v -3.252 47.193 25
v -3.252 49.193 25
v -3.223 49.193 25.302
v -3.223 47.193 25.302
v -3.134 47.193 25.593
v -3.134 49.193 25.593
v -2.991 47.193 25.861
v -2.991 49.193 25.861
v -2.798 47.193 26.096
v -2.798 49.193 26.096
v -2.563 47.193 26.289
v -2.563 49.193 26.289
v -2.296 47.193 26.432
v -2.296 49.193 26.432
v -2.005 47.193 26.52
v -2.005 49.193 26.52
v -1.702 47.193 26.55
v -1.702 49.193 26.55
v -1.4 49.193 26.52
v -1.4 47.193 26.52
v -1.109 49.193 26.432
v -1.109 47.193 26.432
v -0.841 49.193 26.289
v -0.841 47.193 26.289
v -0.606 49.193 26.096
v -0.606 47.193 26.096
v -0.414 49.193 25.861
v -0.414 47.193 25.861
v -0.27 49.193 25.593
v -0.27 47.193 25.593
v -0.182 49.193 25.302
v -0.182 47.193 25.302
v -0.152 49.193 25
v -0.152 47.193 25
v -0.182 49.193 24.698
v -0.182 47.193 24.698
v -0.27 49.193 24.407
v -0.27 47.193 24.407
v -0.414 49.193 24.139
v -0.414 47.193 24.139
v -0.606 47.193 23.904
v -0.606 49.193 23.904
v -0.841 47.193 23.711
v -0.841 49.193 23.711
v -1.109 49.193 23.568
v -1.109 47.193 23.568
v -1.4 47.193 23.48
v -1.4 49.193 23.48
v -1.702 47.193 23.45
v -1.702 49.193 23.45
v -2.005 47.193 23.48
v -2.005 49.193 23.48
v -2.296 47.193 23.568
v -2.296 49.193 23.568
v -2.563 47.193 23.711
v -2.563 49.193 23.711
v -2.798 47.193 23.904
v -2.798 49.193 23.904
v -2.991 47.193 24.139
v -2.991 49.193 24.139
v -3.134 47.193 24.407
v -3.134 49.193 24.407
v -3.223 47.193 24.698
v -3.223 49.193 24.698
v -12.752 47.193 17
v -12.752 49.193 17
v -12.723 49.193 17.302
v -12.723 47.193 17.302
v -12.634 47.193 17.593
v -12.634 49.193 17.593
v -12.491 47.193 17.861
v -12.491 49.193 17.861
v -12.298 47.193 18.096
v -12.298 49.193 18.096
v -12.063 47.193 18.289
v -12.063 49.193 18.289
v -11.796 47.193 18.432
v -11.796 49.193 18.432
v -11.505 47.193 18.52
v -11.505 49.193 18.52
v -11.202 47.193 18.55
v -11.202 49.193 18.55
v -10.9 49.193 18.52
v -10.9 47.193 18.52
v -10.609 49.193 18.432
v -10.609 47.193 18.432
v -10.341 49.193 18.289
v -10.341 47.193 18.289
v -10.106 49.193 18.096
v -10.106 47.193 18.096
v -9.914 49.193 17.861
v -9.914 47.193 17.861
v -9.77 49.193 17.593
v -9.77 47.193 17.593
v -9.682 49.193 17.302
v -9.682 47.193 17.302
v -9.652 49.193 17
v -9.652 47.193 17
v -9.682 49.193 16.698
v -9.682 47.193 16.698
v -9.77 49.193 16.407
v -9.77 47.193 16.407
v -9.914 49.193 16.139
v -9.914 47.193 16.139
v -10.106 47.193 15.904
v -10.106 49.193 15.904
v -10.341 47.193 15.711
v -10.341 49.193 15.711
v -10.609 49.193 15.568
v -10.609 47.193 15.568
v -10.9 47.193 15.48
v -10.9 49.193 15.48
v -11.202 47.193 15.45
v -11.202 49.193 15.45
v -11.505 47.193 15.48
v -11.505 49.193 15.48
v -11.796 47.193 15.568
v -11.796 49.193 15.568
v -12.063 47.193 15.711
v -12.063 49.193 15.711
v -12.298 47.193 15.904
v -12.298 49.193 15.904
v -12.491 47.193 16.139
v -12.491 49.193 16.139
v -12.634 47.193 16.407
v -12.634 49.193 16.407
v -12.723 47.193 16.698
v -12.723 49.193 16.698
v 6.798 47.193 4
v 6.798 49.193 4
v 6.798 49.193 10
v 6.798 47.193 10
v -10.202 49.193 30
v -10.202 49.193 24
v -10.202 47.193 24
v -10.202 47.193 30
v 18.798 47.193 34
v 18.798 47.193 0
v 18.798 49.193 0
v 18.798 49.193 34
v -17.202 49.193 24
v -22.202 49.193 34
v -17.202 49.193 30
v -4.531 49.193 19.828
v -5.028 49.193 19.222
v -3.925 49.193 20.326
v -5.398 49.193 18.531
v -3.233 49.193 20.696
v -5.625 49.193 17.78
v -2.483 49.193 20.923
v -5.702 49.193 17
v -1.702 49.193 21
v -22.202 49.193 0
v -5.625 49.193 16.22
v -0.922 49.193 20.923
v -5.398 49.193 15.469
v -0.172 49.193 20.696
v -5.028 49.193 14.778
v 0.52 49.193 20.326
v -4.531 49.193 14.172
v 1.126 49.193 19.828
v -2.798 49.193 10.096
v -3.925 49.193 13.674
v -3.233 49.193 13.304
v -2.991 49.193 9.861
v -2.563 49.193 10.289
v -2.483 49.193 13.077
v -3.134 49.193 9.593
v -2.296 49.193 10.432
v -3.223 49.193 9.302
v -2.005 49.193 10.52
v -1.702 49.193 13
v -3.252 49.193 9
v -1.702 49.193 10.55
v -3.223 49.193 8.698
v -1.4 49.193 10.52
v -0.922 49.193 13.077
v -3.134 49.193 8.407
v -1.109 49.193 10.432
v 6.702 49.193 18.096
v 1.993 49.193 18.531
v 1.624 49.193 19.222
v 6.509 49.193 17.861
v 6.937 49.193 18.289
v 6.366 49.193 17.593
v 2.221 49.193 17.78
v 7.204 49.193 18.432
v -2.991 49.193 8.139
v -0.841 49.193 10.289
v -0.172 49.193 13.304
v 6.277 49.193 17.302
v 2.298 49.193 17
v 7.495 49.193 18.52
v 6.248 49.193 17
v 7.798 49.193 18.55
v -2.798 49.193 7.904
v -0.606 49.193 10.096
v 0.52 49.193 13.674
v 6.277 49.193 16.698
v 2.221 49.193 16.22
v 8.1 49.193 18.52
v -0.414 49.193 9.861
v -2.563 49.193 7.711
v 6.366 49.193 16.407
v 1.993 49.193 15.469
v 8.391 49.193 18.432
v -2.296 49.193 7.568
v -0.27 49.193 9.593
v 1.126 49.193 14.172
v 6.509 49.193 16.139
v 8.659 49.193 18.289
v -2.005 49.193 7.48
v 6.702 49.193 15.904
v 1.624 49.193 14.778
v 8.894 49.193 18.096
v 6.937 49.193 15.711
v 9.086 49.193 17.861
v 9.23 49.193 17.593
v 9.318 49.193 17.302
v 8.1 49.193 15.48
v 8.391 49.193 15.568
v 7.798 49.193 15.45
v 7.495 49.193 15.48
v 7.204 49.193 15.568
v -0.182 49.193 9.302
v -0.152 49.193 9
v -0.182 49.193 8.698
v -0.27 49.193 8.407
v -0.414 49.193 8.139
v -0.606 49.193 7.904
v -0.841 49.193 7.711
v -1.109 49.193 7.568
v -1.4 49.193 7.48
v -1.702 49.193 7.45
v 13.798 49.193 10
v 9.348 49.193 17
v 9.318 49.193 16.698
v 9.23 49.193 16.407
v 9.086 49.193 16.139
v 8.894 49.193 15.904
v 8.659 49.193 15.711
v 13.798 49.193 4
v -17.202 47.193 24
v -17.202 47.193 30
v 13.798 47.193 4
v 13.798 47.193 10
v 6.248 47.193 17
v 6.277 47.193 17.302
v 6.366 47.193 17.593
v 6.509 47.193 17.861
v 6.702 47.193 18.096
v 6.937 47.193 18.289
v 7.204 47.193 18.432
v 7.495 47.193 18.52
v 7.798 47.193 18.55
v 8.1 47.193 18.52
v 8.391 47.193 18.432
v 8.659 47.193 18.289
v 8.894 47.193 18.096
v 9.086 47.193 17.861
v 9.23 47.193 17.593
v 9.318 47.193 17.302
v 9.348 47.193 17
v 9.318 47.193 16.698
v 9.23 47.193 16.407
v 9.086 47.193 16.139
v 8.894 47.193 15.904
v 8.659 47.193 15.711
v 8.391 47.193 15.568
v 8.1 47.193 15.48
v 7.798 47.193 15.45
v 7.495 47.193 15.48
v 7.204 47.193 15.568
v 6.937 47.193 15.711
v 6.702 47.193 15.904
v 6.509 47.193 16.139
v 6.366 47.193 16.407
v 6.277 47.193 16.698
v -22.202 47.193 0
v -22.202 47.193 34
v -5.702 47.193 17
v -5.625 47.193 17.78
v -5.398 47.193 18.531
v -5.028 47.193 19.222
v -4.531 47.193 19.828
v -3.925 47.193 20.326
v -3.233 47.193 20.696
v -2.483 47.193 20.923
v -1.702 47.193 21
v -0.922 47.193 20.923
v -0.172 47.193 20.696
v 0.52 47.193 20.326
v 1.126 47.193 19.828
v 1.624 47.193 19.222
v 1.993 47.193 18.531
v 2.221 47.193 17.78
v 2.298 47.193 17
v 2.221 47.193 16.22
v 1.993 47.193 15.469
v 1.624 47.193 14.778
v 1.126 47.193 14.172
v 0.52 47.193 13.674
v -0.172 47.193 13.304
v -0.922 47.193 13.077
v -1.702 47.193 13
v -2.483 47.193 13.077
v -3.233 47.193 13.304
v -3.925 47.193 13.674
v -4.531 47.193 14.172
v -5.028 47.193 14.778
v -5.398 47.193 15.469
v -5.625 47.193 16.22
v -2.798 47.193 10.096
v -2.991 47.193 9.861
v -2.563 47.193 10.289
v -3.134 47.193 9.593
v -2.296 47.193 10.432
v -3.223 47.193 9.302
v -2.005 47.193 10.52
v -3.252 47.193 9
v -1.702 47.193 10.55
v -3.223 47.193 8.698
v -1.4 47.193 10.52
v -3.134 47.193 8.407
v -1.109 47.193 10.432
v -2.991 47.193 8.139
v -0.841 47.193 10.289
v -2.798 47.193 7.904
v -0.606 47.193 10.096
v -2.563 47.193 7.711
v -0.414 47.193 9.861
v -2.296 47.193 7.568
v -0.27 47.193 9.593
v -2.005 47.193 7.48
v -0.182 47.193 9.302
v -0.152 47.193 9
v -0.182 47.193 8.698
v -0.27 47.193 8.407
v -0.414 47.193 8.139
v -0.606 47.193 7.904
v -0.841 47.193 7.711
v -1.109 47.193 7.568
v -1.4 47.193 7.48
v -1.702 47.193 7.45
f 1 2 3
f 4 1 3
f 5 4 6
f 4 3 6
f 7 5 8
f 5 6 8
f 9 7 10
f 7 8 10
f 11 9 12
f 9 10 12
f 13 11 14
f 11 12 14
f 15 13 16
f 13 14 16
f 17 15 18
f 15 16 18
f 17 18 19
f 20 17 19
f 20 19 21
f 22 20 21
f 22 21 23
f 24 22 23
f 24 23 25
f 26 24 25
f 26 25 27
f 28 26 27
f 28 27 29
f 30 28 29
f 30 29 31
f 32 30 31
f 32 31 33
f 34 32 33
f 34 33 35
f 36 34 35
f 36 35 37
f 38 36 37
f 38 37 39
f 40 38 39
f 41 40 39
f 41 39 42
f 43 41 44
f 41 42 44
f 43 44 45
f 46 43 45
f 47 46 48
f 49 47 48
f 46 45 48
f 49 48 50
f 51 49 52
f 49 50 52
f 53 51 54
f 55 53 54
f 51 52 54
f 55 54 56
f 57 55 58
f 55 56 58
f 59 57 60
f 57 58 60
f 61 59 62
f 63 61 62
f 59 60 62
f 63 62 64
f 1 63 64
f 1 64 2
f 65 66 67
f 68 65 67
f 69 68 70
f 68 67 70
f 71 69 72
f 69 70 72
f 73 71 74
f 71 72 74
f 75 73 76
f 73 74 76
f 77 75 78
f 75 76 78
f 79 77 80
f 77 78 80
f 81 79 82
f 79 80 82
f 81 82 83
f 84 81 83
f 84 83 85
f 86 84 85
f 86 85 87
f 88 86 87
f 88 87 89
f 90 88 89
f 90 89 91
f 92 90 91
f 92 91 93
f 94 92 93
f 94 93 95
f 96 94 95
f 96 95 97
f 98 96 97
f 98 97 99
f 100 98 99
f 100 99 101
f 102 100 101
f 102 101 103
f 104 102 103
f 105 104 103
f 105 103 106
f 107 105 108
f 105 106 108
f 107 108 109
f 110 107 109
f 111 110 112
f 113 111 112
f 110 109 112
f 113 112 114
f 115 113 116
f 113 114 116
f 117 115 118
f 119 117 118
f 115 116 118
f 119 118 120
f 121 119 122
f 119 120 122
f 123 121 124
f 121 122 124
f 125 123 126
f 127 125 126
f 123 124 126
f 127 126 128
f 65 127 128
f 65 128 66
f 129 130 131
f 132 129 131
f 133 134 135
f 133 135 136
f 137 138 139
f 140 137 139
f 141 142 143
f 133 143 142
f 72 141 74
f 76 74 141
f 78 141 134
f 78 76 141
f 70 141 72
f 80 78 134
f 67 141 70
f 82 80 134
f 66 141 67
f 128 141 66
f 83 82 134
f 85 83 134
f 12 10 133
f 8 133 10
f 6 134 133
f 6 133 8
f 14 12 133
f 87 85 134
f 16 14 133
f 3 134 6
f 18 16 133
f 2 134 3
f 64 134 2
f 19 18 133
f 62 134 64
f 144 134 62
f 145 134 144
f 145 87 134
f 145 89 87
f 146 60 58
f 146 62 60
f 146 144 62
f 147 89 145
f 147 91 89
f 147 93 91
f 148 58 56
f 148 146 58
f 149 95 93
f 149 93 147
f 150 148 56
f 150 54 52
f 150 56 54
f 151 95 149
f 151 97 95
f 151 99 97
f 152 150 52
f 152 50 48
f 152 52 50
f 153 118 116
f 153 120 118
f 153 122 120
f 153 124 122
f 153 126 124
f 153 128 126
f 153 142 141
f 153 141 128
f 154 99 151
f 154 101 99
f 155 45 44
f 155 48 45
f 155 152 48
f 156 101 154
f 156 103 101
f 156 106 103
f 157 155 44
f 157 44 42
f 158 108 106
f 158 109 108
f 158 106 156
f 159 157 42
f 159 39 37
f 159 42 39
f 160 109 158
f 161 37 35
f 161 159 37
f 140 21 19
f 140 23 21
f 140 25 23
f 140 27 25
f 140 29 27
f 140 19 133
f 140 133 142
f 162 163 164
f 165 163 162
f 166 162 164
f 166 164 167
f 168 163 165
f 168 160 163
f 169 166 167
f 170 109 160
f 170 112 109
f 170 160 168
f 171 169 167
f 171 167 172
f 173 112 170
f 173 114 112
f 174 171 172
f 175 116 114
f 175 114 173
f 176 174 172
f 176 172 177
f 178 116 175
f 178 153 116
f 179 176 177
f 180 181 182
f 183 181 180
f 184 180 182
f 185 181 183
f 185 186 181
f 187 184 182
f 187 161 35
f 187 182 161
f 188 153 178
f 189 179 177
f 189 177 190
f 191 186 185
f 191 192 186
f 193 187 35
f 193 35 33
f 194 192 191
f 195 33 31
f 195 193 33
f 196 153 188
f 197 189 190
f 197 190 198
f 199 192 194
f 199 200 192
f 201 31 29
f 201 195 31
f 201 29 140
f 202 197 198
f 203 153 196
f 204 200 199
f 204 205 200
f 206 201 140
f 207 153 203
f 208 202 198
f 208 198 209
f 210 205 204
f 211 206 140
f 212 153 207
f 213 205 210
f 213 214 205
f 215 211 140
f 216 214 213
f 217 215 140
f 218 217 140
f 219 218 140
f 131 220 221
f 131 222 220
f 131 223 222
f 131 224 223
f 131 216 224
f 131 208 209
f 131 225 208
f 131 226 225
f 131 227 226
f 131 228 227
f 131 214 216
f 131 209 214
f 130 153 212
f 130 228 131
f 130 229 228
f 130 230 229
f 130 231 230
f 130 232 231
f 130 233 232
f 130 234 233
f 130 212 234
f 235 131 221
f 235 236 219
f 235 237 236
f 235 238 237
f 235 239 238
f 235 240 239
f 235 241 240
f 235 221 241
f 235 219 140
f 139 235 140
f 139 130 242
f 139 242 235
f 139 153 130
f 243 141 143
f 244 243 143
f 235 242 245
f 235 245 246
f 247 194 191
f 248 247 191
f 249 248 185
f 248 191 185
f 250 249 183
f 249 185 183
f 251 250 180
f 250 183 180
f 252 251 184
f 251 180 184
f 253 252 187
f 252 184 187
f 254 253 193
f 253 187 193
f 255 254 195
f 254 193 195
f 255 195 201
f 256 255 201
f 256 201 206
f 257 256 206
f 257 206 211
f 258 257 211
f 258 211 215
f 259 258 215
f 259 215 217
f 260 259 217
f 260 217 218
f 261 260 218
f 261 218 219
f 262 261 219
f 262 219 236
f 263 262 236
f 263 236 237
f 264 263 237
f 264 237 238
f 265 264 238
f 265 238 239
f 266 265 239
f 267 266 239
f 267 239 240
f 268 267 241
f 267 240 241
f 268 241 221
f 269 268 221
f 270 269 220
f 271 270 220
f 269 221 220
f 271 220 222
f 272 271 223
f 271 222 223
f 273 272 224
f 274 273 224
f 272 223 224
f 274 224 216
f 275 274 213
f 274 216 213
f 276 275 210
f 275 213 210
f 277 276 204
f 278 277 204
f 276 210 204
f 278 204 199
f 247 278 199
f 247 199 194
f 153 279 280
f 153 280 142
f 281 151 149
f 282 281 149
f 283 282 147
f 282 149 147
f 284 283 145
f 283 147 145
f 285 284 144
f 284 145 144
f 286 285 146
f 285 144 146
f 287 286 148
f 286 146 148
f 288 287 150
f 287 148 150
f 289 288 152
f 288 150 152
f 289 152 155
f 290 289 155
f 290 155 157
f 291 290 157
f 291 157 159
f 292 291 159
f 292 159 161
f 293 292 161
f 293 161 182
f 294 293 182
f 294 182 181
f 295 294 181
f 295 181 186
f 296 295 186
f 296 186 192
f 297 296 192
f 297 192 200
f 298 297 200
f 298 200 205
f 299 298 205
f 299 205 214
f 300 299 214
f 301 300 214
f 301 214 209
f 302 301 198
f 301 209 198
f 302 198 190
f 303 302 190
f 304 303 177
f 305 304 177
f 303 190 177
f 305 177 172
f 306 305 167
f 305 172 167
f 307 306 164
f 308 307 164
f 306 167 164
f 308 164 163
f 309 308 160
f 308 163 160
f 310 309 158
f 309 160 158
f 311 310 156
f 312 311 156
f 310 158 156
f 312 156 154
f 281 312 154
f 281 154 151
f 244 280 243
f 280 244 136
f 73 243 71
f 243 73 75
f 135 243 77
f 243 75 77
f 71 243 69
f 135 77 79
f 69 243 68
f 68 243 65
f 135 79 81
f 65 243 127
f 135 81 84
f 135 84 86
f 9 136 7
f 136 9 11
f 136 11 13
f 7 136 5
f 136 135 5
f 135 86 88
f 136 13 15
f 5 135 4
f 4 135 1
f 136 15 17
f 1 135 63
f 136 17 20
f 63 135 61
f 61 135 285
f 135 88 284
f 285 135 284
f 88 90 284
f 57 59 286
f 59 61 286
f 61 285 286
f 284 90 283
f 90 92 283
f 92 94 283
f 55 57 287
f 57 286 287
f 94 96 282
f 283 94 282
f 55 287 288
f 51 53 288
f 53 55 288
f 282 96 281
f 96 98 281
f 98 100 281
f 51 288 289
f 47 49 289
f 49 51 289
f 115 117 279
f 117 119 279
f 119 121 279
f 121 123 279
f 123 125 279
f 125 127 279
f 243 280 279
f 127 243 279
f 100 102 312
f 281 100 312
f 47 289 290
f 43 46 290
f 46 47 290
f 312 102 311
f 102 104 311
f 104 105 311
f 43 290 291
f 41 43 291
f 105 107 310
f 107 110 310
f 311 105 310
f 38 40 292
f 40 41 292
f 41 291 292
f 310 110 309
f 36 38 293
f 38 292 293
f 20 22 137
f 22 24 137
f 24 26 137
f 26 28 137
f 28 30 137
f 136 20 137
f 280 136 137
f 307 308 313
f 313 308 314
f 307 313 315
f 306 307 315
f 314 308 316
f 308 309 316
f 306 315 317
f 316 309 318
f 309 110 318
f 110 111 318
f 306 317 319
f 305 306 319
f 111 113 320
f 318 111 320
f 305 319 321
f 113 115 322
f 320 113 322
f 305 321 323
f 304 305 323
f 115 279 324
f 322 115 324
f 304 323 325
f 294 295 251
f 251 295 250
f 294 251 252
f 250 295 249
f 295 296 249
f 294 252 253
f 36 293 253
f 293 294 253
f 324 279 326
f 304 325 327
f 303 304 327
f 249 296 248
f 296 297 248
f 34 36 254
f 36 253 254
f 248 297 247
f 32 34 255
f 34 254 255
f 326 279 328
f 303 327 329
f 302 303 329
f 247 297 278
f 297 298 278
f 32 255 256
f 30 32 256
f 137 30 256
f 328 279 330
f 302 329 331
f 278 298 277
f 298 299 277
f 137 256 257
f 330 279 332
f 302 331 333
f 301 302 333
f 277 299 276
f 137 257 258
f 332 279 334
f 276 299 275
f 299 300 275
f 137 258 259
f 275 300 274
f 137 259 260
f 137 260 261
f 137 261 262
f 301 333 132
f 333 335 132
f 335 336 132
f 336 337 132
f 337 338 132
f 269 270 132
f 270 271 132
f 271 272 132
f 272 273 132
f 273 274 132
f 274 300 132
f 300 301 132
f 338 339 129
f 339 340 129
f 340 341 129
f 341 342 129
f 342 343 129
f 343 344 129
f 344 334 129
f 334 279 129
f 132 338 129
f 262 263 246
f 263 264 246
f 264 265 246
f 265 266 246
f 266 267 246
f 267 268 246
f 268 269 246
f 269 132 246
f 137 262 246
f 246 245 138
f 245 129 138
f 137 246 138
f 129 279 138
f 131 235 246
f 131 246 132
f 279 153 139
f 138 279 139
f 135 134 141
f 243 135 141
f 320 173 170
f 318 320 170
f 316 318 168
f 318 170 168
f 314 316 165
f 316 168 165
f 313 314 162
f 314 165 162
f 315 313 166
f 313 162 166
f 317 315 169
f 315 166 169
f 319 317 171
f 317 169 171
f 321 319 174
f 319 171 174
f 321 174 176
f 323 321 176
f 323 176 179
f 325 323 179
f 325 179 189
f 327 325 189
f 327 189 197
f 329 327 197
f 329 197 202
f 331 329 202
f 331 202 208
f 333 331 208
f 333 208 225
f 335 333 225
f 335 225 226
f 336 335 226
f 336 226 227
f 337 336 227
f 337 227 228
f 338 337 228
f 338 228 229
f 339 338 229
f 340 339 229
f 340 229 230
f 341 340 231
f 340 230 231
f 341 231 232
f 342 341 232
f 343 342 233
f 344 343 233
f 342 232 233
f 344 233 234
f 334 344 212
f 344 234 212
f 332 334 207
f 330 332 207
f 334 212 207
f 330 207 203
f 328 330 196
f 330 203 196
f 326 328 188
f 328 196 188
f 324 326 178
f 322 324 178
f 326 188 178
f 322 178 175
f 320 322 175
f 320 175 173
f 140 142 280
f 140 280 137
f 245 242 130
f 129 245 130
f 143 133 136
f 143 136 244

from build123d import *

# Parameters (mm, degrees)
F0_W     = 41
F0_H     = 90
F1_DEPTH = 34
F2_W     = 35
F2_H     = 29
F3_DEPTH = 86
F4_W     = 7
F4_H     = 6
F4_R     = 4
F4_R_2   = 1.55
F5_DEPTH = 4
F6_DEPTH = 86
F7_DEPTH = 2


with BuildPart() as f1:
    # F0 (on Top) → F1 (new body)
    with BuildSketch(Plane.XY):
        with Locations((-1.7023412511, 4.193077401)):
            Rectangle(F0_W, F0_H)
    extrude(amount=F1_DEPTH)

    # F2 (on face) → F3 (cut)
    with BuildSketch(Plane.XZ.offset(40.806922599)):
        with Locations((-1.7023412511, 17)):
            Rectangle(F2_W, F2_H)
    extrude(amount=-F3_DEPTH, mode=Mode.SUBTRACT)

    # F4 (on face) → F5 (cut, through all)
    with BuildSketch(Plane(origin=(0, 49.193077401, 0), x_dir=(-1, 0, 0), z_dir=(0, 1, 0))):
        with Locations((-10.2976587489, 7)):
            Rectangle(F4_W, F4_H)
        with Locations((1.7023412511, 17)):
            Circle(F4_R)
        with Locations((13.7023412511, 27)):
            Rectangle(F4_W, F4_H)
        with Locations((11.2023412511, 17)):
            Circle(F4_R_2)
        with Locations((-7.7976587489, 17)):
            Circle(F4_R_2)
        with Locations((1.7023412511, 25)):
            Circle(F4_R_2)
        with Locations((1.7023412511, 9)):
            Circle(F4_R_2)
    extrude(amount=-F5_DEPTH, mode=Mode.SUBTRACT)

    # F6 (cut): a face of the model
    f6_faces = [f1.faces().sort_by_distance(p)[0] for p in [
        (-21.6697062917, -40.806922599, 17),
    ]]
    extrude(f6_faces, amount=-F6_DEPTH, mode=Mode.SUBTRACT)

    # F7 (cut): a face of the model
    f7_faces = [f1.faces().sort_by_distance(p)[0] for p in [
        (-21.6697062917, 45.193077401, 17),
    ]]
    extrude(f7_faces, amount=-F7_DEPTH, mode=Mode.SUBTRACT)


solid = f1.part
